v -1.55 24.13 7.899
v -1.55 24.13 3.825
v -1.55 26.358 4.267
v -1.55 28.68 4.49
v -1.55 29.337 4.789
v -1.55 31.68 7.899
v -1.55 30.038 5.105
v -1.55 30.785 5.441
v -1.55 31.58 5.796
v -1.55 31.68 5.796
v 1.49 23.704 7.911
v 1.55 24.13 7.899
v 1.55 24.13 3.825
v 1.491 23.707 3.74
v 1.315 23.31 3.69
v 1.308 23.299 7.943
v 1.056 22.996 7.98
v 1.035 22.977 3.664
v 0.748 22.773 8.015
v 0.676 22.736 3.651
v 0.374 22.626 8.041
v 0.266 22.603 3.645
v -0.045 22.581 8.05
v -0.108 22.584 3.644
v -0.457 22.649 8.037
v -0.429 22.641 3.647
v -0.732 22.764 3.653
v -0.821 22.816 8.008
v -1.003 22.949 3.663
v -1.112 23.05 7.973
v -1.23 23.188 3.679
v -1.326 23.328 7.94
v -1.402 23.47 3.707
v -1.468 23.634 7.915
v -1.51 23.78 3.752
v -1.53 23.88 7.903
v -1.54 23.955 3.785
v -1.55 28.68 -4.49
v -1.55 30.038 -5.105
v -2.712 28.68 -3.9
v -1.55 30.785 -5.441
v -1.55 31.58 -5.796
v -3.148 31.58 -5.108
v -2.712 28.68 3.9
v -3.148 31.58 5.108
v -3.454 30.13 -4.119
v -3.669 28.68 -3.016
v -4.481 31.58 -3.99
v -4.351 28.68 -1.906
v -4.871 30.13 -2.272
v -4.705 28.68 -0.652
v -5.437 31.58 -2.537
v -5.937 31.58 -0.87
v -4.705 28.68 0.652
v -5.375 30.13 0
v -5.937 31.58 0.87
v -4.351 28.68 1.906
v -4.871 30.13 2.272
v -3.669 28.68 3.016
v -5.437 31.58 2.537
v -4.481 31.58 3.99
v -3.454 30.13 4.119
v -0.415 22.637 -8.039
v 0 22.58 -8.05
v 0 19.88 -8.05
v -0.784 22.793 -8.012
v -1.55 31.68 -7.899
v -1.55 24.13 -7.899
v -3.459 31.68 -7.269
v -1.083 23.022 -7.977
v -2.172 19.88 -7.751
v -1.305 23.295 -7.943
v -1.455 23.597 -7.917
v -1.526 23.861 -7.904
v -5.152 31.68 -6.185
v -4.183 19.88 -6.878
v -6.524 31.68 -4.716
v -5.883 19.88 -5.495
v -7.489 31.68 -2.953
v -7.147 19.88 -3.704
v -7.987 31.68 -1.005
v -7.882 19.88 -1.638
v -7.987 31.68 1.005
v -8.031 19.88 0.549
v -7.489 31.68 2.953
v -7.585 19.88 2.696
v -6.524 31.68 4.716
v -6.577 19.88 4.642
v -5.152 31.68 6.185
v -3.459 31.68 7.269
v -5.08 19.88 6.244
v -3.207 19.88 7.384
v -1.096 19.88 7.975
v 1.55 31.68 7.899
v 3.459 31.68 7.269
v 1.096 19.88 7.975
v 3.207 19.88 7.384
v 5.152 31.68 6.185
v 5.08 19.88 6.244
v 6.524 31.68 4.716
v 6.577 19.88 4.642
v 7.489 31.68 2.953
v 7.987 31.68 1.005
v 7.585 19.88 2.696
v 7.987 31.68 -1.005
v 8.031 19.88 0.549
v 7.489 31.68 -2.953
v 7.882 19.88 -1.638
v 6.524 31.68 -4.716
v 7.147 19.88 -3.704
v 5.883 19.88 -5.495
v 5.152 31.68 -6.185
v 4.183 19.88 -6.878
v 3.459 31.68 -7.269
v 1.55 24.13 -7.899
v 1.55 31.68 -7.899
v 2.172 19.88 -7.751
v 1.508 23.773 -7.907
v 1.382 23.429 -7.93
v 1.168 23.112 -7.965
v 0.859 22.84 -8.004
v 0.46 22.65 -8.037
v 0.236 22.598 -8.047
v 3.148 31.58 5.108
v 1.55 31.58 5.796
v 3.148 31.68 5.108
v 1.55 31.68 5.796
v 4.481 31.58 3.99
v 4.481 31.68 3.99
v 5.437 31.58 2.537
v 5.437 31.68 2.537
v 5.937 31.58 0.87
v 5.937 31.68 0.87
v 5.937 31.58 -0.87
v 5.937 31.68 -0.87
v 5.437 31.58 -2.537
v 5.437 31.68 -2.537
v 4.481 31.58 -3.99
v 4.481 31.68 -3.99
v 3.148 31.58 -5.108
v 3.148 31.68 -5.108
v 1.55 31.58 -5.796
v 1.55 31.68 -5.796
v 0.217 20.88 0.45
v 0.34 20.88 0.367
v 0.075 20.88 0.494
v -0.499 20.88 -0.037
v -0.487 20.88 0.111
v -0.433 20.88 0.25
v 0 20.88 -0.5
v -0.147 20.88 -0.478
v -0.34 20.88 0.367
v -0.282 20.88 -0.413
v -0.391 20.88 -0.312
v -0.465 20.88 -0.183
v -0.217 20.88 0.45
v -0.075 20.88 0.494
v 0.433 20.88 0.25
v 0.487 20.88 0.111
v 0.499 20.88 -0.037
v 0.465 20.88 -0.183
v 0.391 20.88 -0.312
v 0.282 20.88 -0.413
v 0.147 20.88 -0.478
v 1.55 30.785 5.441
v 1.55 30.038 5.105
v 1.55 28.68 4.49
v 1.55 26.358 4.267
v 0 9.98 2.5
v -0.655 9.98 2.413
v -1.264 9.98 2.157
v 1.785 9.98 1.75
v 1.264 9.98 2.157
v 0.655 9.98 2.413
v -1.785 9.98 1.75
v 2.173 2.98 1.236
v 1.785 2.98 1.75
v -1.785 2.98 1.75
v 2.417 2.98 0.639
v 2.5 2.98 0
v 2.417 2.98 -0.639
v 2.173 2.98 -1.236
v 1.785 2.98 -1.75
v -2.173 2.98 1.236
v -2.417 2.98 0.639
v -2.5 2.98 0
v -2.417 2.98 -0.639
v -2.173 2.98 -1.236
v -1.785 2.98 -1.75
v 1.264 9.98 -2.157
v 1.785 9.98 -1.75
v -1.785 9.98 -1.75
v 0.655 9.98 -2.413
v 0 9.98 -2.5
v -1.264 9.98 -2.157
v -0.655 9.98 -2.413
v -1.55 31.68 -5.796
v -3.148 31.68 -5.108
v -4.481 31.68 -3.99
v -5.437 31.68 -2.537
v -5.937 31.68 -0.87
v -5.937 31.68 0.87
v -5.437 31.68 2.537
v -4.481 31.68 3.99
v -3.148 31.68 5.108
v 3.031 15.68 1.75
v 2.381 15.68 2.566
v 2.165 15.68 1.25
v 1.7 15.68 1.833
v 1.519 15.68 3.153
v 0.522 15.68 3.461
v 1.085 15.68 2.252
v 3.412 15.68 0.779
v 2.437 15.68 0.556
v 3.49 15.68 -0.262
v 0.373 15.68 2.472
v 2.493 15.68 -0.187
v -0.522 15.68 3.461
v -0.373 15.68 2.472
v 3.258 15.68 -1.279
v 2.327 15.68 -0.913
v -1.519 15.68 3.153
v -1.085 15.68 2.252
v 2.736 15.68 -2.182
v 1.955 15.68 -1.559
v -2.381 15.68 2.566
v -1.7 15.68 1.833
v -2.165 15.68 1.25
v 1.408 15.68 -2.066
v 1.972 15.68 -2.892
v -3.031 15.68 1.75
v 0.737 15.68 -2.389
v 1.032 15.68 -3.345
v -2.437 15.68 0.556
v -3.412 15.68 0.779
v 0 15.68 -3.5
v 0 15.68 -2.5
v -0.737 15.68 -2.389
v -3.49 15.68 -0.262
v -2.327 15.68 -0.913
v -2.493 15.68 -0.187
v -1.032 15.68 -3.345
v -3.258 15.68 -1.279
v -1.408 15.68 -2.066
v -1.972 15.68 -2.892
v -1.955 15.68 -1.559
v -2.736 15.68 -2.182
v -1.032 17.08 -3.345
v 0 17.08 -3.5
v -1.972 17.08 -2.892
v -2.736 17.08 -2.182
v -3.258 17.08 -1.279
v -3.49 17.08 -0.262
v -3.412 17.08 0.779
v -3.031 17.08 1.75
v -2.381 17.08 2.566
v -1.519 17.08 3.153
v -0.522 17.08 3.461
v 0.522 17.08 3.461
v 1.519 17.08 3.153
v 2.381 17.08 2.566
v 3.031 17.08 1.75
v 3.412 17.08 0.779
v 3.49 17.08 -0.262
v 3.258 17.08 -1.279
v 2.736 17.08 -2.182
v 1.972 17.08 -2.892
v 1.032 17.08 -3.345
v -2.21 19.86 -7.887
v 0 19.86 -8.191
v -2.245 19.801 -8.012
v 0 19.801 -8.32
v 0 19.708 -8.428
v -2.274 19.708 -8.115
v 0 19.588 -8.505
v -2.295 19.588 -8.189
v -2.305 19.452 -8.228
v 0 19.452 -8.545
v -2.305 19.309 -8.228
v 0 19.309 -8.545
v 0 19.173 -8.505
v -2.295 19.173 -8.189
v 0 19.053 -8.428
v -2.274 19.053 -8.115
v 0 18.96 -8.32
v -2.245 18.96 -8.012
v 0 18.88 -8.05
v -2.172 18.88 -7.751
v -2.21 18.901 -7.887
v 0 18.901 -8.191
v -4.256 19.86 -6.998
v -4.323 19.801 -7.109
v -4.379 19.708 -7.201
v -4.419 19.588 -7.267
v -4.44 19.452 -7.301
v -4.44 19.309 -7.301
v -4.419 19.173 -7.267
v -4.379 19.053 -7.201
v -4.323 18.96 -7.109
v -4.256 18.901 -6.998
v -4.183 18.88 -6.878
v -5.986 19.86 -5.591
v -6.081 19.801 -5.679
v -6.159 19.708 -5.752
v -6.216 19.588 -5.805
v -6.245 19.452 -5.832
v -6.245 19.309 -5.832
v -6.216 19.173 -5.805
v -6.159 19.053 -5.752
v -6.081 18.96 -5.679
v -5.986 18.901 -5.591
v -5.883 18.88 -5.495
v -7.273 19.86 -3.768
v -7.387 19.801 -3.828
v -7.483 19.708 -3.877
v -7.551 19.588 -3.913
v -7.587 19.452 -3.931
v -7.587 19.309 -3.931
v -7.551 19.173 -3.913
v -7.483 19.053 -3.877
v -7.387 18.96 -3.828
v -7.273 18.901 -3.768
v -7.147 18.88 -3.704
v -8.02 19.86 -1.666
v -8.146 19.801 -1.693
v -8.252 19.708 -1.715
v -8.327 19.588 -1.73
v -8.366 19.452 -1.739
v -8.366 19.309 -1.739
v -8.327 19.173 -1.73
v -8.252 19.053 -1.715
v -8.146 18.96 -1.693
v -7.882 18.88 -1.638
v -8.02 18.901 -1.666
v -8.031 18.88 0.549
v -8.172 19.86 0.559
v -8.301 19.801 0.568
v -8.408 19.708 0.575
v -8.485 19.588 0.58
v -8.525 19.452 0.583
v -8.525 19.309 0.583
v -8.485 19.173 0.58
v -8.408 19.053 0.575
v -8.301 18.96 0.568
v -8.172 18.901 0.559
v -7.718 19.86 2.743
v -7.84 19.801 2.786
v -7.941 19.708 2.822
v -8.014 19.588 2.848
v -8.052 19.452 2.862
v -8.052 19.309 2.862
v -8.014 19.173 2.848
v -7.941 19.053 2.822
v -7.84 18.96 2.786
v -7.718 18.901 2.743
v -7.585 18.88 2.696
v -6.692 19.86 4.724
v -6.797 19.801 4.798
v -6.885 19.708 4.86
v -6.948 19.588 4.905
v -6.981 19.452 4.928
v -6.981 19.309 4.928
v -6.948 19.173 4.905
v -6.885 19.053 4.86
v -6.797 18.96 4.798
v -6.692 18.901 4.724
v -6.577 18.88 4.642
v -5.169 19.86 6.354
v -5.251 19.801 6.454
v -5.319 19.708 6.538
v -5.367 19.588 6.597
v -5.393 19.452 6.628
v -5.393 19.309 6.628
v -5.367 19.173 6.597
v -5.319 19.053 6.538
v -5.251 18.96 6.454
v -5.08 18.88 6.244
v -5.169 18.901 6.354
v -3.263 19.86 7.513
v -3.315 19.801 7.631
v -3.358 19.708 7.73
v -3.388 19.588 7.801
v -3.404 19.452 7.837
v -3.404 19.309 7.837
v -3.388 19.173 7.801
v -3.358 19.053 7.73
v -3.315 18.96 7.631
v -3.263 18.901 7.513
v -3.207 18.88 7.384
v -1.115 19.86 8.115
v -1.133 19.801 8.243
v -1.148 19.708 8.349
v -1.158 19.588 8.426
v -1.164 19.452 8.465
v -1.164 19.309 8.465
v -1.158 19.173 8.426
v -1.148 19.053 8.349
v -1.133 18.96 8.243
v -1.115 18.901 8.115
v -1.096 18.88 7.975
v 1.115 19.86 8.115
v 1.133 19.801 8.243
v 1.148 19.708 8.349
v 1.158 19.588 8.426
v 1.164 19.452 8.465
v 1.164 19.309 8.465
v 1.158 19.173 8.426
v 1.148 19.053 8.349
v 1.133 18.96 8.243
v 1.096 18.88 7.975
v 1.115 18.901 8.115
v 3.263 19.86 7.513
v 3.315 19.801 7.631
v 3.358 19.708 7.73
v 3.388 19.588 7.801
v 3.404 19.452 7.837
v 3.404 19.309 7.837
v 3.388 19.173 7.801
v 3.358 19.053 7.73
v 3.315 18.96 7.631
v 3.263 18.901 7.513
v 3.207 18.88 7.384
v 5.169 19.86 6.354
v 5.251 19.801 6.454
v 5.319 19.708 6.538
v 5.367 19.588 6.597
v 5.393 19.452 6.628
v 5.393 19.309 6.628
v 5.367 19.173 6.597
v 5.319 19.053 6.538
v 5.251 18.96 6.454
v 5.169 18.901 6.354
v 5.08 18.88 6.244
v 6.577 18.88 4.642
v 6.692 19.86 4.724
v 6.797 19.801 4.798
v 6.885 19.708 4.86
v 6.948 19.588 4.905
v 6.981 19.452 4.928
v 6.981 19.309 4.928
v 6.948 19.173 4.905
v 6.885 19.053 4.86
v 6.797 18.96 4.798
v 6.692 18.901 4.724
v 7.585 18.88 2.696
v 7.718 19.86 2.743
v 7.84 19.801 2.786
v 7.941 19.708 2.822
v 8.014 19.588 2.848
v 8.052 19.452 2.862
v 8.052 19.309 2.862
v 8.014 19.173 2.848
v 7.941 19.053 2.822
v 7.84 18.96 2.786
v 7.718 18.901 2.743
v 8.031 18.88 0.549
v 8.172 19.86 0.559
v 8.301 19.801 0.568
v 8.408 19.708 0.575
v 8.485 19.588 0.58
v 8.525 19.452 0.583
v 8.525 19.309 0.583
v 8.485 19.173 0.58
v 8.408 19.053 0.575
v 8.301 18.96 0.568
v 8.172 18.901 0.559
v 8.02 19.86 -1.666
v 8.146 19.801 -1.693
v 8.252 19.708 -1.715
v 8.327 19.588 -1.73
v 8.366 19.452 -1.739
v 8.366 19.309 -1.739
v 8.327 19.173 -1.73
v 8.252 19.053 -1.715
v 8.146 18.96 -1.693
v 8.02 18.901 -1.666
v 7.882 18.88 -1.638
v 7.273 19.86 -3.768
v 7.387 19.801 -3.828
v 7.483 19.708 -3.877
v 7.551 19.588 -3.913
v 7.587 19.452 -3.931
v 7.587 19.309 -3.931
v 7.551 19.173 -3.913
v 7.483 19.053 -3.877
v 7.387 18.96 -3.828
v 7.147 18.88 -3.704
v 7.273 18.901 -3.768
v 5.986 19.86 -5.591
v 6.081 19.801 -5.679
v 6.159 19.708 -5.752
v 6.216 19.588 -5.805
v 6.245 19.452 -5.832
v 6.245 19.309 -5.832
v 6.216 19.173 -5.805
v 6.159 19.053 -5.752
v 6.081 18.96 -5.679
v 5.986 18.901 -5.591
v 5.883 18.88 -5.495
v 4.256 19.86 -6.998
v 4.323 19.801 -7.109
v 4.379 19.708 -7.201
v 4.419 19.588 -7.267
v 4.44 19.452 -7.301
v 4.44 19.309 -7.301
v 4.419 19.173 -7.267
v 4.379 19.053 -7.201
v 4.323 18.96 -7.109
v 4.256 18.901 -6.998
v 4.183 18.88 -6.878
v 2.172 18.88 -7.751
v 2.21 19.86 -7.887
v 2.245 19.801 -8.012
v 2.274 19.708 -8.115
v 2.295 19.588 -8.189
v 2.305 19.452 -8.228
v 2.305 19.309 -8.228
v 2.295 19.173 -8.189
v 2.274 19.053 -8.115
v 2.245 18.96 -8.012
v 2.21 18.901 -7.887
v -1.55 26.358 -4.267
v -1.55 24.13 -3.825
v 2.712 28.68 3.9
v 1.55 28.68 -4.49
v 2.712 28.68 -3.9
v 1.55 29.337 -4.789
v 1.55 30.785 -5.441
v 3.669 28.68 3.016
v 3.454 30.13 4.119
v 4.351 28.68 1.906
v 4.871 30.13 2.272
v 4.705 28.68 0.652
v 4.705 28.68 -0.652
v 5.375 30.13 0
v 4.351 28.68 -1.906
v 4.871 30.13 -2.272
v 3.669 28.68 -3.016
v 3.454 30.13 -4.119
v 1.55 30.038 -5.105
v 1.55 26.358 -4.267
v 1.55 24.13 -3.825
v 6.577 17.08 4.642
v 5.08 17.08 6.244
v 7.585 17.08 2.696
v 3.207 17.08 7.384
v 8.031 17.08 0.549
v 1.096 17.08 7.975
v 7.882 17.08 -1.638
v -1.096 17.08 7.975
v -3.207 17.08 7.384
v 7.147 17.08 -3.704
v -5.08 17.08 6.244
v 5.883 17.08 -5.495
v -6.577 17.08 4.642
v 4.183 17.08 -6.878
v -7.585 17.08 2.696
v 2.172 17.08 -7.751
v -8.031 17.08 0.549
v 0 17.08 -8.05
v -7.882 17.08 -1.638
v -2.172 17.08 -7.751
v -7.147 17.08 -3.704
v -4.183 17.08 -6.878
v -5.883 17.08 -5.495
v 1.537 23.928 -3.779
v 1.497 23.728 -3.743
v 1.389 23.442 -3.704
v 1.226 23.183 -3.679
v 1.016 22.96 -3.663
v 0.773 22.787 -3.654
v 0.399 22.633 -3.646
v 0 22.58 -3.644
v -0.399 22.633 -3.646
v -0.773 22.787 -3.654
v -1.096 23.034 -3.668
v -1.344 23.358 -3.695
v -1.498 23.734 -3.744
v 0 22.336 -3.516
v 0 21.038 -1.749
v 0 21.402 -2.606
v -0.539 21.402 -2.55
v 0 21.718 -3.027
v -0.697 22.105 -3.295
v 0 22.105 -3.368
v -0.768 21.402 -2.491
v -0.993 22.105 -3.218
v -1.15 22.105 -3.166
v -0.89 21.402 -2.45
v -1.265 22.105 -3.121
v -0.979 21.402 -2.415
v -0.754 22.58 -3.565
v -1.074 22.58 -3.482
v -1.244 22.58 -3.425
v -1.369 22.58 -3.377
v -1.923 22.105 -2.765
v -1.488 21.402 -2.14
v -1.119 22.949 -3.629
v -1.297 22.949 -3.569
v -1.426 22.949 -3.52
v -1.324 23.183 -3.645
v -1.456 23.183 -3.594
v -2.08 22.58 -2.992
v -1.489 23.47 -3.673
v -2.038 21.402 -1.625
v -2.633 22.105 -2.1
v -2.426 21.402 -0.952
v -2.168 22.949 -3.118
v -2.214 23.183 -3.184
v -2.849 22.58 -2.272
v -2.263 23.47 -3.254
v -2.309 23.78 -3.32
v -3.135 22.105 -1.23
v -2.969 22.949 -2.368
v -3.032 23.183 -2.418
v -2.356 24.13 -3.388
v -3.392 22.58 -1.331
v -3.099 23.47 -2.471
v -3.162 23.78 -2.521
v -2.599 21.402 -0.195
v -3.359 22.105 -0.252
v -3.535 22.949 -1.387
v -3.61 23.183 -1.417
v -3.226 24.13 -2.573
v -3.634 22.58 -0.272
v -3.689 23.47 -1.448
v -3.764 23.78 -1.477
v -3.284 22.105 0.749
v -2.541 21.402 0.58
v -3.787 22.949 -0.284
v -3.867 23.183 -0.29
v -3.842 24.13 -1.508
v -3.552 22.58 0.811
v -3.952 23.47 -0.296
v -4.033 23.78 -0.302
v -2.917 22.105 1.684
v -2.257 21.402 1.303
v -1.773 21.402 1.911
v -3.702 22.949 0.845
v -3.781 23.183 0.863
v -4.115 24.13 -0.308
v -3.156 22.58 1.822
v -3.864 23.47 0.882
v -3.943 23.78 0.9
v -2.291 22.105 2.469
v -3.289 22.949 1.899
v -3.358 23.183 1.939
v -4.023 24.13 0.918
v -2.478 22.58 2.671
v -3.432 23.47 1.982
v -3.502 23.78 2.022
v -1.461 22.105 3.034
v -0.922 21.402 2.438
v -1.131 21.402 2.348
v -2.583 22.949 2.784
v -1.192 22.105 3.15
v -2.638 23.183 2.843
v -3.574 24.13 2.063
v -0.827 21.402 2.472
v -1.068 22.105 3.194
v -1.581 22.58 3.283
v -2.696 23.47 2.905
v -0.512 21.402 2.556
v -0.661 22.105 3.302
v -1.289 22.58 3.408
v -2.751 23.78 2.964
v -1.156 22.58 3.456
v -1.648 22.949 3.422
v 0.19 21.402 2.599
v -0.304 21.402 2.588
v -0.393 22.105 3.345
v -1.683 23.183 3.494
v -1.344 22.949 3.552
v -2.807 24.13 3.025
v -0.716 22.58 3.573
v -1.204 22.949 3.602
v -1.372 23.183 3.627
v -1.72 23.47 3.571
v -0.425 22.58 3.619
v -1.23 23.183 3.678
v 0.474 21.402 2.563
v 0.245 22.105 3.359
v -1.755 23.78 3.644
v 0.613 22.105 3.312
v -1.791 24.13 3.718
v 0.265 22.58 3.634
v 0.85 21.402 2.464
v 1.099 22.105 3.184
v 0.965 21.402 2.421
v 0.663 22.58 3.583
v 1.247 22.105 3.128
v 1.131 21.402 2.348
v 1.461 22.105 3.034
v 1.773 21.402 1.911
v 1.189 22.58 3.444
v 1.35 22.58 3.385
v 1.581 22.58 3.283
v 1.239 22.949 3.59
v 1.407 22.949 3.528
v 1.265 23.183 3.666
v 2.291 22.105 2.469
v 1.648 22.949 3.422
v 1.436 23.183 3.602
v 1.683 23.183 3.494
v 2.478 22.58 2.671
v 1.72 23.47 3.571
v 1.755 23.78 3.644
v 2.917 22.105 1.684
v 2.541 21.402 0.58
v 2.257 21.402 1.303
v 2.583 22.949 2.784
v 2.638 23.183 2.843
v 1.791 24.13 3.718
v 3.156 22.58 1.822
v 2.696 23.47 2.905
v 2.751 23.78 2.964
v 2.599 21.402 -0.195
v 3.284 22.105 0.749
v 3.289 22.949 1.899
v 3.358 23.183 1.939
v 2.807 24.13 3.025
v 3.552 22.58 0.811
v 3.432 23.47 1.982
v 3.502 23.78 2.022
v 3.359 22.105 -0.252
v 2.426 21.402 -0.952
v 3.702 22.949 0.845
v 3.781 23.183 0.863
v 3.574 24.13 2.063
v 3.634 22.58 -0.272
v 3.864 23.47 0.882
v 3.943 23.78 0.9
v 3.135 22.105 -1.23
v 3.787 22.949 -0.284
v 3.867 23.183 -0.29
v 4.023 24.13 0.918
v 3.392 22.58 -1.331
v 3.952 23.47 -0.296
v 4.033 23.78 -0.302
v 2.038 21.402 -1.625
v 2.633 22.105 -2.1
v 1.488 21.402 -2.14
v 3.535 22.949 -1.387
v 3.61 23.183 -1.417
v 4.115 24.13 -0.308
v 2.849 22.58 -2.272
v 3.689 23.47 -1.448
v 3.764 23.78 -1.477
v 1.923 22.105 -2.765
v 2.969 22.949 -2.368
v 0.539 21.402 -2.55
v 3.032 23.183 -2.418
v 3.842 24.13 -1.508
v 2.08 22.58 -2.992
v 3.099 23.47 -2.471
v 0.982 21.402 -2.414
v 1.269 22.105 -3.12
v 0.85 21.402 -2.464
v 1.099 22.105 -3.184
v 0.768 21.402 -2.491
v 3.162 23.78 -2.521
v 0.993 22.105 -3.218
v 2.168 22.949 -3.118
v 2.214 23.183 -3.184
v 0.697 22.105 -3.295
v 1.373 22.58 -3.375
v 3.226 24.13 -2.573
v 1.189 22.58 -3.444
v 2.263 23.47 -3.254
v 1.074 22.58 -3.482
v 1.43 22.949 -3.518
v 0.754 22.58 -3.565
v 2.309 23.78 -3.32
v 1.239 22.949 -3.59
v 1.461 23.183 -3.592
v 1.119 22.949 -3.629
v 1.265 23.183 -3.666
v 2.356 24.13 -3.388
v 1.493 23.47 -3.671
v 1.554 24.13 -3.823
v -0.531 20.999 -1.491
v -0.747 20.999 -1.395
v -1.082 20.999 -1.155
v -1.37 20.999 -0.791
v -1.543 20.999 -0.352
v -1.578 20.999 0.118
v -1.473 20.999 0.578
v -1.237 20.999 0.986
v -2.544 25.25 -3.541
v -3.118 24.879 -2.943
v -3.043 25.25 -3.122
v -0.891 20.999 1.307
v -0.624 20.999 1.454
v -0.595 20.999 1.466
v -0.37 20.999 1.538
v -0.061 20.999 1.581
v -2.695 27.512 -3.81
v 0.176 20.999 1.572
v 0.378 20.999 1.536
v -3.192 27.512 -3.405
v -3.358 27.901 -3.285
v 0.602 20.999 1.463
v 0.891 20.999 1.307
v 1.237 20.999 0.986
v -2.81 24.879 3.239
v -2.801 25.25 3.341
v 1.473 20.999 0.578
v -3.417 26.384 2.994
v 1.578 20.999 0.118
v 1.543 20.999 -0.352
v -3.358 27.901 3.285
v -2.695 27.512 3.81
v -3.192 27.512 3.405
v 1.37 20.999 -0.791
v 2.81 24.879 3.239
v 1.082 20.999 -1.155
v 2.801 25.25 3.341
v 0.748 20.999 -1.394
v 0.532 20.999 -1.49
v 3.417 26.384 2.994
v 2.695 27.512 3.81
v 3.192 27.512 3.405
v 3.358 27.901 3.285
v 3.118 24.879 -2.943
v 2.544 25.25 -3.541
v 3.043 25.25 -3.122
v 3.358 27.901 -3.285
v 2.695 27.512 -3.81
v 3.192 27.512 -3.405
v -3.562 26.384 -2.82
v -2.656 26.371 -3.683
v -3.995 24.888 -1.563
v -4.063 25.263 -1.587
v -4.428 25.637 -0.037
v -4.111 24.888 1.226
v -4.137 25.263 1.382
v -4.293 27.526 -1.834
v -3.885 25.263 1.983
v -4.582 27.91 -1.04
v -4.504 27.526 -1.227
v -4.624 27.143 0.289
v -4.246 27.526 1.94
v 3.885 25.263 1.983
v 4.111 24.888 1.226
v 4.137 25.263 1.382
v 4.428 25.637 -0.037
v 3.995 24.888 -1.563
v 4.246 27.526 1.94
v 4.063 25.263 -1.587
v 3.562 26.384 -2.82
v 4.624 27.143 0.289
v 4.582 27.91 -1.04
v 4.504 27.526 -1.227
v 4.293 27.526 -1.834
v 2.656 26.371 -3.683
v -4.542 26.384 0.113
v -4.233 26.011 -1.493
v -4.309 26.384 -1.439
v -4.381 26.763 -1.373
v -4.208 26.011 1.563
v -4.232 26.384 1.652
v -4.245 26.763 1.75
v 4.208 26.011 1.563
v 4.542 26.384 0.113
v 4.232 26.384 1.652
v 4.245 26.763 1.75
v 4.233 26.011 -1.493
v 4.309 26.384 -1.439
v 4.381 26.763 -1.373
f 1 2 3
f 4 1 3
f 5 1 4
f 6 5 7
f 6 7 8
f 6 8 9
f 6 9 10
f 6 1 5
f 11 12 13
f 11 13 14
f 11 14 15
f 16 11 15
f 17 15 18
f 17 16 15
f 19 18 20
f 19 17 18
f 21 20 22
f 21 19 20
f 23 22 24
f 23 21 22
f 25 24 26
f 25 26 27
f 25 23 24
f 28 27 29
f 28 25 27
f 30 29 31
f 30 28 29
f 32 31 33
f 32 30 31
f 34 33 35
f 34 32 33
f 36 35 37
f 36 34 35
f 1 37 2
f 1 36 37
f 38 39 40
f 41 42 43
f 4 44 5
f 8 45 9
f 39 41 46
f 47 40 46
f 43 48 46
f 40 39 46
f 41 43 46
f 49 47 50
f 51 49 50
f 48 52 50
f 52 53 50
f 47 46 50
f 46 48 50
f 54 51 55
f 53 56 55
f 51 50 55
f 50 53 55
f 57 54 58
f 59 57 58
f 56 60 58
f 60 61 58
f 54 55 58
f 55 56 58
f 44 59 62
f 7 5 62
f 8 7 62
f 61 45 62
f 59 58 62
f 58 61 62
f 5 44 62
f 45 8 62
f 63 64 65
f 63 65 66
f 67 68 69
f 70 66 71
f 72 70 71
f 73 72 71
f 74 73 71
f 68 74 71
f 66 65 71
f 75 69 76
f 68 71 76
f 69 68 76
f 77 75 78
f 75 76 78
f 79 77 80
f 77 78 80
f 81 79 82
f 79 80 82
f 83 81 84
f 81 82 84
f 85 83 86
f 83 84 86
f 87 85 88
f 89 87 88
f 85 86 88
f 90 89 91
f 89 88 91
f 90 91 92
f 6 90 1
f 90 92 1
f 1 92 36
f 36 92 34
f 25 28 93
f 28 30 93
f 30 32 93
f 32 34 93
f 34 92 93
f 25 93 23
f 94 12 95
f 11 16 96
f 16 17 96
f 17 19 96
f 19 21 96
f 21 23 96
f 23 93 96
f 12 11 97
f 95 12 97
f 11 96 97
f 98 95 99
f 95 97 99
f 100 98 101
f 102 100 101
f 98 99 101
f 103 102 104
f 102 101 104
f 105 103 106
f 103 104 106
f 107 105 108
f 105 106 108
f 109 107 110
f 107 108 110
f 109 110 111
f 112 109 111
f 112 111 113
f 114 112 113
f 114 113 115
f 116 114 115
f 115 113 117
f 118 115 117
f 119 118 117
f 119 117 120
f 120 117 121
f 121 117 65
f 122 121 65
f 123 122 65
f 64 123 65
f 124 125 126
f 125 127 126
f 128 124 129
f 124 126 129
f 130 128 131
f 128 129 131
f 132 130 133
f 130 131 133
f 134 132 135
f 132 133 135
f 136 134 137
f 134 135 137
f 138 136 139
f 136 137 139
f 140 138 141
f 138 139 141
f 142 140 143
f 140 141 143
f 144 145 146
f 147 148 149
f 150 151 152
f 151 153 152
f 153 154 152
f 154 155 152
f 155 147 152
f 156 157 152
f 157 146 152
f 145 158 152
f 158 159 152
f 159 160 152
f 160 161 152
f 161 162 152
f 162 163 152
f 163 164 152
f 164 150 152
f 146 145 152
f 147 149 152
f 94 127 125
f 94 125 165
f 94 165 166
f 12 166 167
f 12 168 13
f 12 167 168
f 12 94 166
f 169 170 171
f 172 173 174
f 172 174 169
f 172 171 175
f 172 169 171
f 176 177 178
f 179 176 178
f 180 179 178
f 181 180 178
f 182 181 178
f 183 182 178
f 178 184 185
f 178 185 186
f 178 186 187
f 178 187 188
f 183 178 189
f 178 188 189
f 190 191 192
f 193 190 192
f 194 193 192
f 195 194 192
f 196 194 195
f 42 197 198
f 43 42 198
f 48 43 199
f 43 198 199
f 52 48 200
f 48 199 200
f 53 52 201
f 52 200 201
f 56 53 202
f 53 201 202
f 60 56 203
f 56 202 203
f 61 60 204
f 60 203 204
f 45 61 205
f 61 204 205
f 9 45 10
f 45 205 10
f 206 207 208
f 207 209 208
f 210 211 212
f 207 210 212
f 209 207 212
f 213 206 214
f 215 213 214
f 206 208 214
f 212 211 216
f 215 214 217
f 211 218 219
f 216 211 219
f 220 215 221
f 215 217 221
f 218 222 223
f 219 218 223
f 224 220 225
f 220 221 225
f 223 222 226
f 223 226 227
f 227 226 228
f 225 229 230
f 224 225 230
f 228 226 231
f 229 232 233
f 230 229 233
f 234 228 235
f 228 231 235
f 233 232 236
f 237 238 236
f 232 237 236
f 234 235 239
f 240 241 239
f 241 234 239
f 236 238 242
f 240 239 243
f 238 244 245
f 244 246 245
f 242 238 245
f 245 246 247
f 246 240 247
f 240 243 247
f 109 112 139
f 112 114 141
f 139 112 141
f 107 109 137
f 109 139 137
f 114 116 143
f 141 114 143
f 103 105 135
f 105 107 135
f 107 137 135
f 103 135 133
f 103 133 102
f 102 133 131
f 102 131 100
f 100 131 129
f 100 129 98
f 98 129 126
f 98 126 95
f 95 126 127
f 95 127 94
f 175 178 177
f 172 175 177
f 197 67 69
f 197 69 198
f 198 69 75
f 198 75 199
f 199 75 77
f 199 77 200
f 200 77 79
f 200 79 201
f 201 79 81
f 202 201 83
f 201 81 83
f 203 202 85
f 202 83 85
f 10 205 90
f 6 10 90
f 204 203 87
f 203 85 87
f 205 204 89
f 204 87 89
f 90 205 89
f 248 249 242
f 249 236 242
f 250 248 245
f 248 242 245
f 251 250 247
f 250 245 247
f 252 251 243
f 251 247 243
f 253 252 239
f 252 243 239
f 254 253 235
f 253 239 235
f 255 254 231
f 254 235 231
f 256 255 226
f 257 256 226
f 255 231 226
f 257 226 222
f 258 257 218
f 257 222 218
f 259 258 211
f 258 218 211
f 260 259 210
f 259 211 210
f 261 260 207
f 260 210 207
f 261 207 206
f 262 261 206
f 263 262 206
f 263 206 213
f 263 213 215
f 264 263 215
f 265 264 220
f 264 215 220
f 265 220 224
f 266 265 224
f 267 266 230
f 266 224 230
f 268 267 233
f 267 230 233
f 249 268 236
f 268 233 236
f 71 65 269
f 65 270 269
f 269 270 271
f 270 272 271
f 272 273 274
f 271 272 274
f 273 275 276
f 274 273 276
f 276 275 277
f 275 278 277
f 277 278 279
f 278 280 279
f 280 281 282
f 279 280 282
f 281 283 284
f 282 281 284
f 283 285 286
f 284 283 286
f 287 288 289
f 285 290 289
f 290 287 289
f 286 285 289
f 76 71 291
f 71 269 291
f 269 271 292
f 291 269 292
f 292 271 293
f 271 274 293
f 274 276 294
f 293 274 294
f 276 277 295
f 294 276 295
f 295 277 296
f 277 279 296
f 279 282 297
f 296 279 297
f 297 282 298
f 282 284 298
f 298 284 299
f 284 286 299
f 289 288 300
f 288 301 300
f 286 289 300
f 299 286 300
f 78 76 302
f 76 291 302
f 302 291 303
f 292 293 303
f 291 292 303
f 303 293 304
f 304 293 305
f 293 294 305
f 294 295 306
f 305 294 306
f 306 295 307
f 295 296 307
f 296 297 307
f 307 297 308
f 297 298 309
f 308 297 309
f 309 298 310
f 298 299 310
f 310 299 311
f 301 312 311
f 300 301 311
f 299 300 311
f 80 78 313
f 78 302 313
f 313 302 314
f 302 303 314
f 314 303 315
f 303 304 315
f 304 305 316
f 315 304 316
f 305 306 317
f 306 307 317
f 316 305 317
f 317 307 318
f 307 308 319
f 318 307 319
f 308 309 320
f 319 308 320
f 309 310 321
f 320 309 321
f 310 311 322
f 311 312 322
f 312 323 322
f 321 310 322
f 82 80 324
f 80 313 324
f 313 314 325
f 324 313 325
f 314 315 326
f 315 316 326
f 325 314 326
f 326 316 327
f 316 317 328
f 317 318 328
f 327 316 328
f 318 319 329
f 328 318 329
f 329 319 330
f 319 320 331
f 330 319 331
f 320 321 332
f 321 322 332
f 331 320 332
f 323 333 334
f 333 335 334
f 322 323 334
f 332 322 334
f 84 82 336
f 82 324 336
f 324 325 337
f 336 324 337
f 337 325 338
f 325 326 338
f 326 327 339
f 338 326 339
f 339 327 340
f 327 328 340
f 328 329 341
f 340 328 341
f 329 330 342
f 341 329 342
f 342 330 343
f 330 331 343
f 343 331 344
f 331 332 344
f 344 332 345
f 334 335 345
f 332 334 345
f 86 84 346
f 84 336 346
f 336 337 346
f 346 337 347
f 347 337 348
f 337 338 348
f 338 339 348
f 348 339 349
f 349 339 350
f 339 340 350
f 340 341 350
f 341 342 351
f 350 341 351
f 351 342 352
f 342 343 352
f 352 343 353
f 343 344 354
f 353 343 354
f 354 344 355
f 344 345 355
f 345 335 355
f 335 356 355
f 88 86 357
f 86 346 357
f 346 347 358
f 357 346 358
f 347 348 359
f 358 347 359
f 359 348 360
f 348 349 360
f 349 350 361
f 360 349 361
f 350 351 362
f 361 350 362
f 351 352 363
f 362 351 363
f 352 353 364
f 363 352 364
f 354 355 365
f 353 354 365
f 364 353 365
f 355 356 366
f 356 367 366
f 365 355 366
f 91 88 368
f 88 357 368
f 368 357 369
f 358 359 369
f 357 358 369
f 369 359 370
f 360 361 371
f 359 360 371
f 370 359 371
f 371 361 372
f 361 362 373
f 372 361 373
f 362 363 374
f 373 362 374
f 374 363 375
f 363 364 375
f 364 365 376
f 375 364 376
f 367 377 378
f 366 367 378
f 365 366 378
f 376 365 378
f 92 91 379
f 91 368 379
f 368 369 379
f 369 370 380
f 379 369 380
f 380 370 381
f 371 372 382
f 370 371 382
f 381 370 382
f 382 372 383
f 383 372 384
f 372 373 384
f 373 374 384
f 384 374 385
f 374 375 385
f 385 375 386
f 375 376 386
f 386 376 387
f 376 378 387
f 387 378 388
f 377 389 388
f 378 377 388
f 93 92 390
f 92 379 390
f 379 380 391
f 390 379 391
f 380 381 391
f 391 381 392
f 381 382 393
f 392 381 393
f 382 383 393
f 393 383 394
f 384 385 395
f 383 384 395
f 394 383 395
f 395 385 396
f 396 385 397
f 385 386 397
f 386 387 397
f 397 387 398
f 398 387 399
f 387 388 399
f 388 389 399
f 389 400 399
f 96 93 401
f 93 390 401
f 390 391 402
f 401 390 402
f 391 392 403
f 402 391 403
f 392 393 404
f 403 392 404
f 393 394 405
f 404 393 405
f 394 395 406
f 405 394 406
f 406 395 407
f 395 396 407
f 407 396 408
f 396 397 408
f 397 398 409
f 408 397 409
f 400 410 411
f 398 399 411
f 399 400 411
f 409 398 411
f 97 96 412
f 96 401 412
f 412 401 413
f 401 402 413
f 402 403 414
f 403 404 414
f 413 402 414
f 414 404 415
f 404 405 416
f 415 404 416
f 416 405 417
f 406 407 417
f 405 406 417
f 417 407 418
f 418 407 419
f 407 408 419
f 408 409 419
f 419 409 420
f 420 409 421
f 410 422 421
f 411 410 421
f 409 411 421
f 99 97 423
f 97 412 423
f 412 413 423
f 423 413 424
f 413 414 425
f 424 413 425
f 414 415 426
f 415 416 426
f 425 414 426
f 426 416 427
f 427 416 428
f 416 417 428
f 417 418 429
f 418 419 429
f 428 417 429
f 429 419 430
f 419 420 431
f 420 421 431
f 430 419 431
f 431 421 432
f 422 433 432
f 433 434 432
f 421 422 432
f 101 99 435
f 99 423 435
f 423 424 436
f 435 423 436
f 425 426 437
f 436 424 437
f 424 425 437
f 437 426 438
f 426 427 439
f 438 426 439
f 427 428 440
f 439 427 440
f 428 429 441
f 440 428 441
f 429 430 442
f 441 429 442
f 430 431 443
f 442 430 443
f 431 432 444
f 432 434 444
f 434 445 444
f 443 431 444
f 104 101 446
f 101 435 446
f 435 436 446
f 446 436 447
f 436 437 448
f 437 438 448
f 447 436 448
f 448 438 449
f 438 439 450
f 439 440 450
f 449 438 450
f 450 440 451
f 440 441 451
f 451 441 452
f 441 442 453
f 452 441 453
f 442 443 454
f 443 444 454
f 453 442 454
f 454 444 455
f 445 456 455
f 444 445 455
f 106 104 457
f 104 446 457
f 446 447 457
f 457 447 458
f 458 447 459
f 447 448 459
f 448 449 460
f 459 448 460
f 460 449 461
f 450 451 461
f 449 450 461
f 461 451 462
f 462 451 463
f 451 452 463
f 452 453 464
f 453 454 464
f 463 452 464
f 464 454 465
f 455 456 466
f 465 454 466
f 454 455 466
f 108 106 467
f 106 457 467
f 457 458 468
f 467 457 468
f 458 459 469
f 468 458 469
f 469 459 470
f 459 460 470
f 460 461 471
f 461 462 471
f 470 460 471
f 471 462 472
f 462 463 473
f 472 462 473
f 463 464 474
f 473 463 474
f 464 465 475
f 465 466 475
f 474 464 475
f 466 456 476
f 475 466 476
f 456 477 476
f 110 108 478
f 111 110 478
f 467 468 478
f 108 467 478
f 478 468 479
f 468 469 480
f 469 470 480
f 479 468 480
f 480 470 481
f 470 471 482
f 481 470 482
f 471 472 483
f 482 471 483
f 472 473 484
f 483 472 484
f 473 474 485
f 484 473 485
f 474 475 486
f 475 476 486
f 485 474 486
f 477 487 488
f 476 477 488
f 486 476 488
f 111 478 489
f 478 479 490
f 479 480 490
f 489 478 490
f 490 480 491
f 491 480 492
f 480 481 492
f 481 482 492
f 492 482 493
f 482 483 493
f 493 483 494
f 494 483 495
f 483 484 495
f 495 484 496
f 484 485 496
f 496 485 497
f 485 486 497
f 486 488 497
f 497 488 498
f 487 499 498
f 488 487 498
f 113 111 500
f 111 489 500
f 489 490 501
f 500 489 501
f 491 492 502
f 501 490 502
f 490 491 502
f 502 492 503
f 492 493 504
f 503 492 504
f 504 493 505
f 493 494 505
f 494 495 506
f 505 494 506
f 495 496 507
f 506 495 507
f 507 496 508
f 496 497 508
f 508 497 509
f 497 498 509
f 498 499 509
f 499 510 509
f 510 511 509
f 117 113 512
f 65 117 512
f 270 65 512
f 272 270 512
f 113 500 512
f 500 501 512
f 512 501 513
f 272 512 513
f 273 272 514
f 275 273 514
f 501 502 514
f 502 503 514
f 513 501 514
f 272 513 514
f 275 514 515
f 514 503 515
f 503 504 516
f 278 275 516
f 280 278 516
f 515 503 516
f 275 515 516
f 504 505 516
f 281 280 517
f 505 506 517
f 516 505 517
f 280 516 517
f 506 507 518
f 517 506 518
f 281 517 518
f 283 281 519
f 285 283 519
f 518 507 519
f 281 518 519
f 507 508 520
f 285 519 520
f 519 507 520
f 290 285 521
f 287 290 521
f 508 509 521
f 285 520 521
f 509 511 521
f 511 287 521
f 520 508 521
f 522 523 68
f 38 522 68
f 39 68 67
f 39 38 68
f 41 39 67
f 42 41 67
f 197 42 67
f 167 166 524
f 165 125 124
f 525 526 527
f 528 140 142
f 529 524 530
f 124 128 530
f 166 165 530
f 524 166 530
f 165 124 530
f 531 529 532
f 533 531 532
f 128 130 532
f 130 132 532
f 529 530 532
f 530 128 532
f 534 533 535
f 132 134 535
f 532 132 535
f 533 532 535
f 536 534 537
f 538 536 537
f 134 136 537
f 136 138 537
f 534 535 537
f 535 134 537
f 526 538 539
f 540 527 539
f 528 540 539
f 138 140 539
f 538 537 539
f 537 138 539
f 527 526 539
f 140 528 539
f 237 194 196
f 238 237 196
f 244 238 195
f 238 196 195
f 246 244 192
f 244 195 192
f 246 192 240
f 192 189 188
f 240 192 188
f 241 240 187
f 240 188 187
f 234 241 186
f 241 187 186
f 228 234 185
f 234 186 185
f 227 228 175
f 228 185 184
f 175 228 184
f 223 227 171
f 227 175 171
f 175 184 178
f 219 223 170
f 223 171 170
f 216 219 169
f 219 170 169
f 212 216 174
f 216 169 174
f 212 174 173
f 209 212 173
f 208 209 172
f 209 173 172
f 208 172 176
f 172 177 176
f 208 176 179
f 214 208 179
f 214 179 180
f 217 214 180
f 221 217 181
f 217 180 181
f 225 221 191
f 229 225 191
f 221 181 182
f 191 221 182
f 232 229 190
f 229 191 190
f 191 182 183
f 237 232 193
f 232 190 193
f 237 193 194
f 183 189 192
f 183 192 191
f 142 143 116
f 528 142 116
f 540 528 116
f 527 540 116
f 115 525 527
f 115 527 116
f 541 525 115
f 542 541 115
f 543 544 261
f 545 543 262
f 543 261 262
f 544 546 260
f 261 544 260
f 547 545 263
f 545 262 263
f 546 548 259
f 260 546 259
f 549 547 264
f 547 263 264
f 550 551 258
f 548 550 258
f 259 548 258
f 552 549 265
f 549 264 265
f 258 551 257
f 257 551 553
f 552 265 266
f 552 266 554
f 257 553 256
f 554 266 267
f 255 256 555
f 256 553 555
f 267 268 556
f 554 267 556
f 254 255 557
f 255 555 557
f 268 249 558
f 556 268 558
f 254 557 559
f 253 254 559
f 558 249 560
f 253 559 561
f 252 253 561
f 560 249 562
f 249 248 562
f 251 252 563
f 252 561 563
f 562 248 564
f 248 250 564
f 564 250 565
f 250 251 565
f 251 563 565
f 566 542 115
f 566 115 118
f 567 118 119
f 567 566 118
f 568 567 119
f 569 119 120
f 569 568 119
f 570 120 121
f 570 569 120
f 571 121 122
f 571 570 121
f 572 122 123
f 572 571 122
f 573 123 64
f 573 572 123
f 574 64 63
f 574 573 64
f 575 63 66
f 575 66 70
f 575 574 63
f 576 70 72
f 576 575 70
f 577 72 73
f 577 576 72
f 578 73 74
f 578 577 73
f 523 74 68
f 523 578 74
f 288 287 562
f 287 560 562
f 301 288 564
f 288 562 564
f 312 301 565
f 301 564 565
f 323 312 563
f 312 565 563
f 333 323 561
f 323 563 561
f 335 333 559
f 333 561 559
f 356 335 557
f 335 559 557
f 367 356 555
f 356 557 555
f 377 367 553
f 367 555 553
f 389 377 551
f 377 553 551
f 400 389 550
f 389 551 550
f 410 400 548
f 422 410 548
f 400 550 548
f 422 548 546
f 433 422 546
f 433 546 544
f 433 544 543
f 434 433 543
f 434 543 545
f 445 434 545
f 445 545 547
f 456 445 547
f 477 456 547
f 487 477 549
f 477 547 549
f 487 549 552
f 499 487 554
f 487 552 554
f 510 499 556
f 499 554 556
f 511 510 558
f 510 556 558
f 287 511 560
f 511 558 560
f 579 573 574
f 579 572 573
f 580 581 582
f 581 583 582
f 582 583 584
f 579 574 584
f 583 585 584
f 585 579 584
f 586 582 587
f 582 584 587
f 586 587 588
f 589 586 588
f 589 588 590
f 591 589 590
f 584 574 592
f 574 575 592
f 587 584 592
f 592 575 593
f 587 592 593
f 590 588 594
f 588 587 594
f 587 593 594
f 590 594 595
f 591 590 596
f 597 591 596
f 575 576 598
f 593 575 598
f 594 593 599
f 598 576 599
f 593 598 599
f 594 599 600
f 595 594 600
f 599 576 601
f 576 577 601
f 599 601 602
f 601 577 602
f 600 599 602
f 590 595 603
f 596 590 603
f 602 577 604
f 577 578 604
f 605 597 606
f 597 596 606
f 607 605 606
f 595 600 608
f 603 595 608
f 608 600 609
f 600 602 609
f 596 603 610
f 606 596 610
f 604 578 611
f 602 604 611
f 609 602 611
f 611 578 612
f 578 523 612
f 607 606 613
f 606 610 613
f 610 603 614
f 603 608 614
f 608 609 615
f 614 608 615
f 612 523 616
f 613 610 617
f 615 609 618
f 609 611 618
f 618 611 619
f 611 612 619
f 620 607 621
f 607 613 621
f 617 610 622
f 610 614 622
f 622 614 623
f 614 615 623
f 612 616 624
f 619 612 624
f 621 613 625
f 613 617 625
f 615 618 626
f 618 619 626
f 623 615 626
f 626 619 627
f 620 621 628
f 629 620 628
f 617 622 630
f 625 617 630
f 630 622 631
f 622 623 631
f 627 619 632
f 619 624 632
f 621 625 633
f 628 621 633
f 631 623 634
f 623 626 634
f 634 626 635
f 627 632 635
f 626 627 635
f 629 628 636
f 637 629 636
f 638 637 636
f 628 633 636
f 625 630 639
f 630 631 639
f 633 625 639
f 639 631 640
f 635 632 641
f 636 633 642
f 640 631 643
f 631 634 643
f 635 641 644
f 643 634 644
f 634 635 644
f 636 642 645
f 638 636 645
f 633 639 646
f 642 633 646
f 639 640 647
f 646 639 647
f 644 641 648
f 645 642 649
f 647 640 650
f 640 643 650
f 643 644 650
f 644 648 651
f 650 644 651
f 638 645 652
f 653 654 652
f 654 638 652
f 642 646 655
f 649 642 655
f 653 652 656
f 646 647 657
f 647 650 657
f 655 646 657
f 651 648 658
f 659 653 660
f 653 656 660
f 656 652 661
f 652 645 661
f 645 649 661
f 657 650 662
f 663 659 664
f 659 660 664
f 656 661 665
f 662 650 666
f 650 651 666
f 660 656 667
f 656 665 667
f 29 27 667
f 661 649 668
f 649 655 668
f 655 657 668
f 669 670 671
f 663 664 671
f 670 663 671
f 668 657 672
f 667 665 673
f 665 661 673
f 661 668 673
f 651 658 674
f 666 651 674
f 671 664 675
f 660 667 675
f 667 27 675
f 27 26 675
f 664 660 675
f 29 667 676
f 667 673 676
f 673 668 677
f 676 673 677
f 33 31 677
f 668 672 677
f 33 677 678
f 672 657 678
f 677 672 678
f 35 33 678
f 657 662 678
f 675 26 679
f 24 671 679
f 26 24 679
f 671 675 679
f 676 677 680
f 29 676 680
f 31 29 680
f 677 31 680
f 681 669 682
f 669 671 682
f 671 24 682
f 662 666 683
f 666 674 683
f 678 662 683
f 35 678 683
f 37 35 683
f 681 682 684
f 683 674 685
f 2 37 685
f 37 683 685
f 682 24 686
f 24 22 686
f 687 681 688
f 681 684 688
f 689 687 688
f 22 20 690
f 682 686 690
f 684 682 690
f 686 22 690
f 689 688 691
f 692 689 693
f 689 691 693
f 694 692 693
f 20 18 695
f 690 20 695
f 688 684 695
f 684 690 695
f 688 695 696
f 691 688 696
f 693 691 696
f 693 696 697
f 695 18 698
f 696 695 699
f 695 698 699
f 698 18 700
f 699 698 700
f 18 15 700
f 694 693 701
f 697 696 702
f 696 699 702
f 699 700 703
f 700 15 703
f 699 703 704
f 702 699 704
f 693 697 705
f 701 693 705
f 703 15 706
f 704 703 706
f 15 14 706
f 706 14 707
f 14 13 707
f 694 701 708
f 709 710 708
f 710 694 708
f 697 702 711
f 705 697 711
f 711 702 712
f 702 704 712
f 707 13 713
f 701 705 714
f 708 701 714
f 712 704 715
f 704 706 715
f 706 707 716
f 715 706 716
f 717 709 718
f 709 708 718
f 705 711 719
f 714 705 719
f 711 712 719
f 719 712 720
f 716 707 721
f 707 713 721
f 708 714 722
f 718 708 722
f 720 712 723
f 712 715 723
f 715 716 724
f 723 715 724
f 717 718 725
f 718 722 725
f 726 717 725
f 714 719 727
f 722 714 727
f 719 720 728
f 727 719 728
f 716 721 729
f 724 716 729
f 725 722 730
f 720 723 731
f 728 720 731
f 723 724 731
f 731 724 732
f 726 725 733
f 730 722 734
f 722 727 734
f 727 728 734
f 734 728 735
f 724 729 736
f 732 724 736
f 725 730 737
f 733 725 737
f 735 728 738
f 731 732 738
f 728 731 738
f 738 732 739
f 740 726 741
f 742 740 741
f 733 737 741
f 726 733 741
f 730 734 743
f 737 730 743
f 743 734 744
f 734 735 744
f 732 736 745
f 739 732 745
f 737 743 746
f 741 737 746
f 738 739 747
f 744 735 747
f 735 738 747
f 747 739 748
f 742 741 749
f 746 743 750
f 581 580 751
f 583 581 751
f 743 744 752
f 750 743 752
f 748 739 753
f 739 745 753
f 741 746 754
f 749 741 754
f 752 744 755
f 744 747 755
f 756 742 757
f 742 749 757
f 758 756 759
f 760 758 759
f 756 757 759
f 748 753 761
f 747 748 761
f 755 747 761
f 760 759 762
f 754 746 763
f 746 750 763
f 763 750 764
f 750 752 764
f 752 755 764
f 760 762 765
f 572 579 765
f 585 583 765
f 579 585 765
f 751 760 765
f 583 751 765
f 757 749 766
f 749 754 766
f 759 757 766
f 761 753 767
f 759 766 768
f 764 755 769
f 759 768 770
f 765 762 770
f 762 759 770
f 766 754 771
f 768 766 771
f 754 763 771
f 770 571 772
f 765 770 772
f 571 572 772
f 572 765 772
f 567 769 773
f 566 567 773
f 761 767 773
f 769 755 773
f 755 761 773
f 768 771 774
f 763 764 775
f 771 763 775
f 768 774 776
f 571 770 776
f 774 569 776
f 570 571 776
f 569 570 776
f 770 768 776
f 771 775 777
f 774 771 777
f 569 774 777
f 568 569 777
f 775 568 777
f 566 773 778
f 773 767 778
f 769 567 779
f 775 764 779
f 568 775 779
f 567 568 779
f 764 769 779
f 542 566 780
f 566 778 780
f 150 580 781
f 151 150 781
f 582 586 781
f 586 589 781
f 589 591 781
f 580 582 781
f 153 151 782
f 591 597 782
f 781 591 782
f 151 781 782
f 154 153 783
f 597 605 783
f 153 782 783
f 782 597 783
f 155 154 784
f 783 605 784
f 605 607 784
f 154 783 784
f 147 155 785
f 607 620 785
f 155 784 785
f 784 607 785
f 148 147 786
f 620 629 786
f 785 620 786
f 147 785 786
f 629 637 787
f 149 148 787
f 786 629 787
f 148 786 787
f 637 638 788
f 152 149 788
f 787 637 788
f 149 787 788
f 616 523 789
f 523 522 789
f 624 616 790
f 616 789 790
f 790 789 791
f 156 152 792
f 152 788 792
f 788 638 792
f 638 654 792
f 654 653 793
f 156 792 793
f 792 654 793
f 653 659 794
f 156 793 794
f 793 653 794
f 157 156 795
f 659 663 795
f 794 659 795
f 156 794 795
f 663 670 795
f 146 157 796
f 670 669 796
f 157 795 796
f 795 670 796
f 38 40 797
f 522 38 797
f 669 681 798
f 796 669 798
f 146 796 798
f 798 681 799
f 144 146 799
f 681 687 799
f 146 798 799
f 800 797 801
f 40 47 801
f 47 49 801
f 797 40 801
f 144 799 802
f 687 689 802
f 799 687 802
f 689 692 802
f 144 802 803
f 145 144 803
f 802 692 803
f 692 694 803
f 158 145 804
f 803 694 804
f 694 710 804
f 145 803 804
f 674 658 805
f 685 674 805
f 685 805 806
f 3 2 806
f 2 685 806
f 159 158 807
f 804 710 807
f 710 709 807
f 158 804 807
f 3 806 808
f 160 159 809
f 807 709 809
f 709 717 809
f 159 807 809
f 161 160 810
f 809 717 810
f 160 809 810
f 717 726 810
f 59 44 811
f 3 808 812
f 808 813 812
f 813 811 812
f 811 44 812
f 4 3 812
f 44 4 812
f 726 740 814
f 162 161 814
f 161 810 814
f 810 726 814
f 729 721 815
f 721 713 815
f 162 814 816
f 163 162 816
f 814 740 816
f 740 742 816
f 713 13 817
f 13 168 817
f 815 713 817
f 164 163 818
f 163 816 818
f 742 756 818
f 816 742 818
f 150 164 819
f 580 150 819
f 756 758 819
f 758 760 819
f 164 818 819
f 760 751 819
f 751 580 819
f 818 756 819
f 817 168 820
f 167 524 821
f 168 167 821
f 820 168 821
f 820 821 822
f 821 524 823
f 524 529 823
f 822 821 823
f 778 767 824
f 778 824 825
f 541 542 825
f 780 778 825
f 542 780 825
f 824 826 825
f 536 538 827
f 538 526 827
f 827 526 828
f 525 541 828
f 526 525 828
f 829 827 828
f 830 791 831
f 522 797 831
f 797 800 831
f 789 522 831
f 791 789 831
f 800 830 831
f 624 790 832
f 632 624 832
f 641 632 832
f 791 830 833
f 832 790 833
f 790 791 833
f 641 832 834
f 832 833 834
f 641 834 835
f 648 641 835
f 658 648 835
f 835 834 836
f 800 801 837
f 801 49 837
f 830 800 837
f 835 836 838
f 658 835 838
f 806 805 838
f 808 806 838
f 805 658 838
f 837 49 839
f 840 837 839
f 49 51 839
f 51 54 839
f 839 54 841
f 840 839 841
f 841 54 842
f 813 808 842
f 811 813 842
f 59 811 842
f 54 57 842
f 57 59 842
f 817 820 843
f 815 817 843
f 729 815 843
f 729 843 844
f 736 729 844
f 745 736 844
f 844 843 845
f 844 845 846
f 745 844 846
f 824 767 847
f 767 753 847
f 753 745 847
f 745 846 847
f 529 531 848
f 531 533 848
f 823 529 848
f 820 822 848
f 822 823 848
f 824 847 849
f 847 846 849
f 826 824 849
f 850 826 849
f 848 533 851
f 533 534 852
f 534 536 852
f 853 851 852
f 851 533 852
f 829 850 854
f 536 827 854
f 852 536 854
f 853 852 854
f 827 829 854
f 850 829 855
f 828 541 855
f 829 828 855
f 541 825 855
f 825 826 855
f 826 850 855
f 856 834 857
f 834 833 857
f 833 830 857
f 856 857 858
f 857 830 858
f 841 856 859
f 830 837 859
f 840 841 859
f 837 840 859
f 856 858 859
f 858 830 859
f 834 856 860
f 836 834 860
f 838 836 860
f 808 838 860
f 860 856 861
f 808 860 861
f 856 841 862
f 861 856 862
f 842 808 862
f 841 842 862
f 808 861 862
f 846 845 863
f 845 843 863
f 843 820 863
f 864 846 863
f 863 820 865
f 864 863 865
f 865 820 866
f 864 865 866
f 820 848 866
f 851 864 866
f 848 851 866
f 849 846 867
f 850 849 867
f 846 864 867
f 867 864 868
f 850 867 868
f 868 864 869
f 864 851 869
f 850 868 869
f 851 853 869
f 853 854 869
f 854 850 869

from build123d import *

# Parameters (mm, degrees)
EXTRUDE1_DEPTH = 7
EXTRUDE2_DEPTH = 20.3


with BuildPart() as part:
    # Sketch1 → Revolve1 (revolve)
    with BuildSketch(Plane.XY, mode=Mode.PRIVATE) as revolve1_sk:
        with BuildLine():
            Line((6, 31.680378901), (8.05, 31.680378901))
            Line((8.05, 31.680378901), (8.05, 19.880378901))
            ThreePointArc((8.05, 19.880378901), (8.55, 19.380378901), (8.05, 18.880378901))
            Line((8.05, 18.880378901), (8.05, 17.080378901))
            Line((8.05, 17.080378901), (3.5, 17.080378901))
            Line((3.5, 17.080378901), (3.5, 15.680378901))
            Line((3.5, 15.680378901), (2.5, 15.680378901))
            Line((2.5, 15.680378901), (2.5, 2.980378901))
            Line((2.5, 2.980378901), (0, 2.980378901))
            Line((0, 2.980378901), (0, 20.880378901))
            Line((0, 20.880378901), (0.5, 20.880378901))
            add(Edge.make_bspline(
                [(0.5, 20.880378901), (0.932106432, 20.906651763), (1.887530423, 20.96474329), (3.549630763, 21.874391527), (4.219232089, 24.338558209), (4.618386004, 26.623285295), (4.718036301, 28.180794336), (4.75, 28.680378901)],
                knots=[0, 0, 0, 0, 0.130075309, 0.287607547, 0.531387804, 0.849688564, 1, 1, 1, 1], degree=3))
            Line((4.75, 28.680378901), (6, 31.580378901))
            Line((6, 31.580378901), (6, 31.680378901))
        make_face()
    revolve(revolve1_sk.sketch.rotate(Axis((0, 0, 0), (0, 1, 0)), 90), axis=Axis((0, 0, 0), (0, 1, 0)))  # turned: the seam where the file's is

    # Sketch2 → Extrude1 (cut)
    with BuildSketch(Plane.XZ.offset(-2.980378901)):
        Polygon((1.785357107, 1.75), (4.264804166, 1.75), (0.483637586, 4.675163329), (-4.469983747, 1.75), align=None)
        Polygon((-4.469983747, -1.75), (4.264804166, -1.75), (0.383778189, -4.04178496), align=None)
    extrude(amount=-EXTRUDE1_DEPTH, mode=Mode.SUBTRACT)

    # Sketch3 → Extrude2 (cut, through all)
    with BuildSketch(Plane.XY.offset(10.75)):
        with BuildLine():
            Line((-1.55, 37.698212451), (1.55, 37.698212451))
            Line((1.55, 37.698212451), (1.55, 24.130378901))
            ThreePointArc((1.55, 24.130378901), (0, 22.580378901), (-1.55, 24.130378901))
            Line((-1.55, 24.130378901), (-1.55, 37.698212451))
        make_face()
    extrude(amount=-EXTRUDE2_DEPTH, mode=Mode.SUBTRACT)


solid = part.part
